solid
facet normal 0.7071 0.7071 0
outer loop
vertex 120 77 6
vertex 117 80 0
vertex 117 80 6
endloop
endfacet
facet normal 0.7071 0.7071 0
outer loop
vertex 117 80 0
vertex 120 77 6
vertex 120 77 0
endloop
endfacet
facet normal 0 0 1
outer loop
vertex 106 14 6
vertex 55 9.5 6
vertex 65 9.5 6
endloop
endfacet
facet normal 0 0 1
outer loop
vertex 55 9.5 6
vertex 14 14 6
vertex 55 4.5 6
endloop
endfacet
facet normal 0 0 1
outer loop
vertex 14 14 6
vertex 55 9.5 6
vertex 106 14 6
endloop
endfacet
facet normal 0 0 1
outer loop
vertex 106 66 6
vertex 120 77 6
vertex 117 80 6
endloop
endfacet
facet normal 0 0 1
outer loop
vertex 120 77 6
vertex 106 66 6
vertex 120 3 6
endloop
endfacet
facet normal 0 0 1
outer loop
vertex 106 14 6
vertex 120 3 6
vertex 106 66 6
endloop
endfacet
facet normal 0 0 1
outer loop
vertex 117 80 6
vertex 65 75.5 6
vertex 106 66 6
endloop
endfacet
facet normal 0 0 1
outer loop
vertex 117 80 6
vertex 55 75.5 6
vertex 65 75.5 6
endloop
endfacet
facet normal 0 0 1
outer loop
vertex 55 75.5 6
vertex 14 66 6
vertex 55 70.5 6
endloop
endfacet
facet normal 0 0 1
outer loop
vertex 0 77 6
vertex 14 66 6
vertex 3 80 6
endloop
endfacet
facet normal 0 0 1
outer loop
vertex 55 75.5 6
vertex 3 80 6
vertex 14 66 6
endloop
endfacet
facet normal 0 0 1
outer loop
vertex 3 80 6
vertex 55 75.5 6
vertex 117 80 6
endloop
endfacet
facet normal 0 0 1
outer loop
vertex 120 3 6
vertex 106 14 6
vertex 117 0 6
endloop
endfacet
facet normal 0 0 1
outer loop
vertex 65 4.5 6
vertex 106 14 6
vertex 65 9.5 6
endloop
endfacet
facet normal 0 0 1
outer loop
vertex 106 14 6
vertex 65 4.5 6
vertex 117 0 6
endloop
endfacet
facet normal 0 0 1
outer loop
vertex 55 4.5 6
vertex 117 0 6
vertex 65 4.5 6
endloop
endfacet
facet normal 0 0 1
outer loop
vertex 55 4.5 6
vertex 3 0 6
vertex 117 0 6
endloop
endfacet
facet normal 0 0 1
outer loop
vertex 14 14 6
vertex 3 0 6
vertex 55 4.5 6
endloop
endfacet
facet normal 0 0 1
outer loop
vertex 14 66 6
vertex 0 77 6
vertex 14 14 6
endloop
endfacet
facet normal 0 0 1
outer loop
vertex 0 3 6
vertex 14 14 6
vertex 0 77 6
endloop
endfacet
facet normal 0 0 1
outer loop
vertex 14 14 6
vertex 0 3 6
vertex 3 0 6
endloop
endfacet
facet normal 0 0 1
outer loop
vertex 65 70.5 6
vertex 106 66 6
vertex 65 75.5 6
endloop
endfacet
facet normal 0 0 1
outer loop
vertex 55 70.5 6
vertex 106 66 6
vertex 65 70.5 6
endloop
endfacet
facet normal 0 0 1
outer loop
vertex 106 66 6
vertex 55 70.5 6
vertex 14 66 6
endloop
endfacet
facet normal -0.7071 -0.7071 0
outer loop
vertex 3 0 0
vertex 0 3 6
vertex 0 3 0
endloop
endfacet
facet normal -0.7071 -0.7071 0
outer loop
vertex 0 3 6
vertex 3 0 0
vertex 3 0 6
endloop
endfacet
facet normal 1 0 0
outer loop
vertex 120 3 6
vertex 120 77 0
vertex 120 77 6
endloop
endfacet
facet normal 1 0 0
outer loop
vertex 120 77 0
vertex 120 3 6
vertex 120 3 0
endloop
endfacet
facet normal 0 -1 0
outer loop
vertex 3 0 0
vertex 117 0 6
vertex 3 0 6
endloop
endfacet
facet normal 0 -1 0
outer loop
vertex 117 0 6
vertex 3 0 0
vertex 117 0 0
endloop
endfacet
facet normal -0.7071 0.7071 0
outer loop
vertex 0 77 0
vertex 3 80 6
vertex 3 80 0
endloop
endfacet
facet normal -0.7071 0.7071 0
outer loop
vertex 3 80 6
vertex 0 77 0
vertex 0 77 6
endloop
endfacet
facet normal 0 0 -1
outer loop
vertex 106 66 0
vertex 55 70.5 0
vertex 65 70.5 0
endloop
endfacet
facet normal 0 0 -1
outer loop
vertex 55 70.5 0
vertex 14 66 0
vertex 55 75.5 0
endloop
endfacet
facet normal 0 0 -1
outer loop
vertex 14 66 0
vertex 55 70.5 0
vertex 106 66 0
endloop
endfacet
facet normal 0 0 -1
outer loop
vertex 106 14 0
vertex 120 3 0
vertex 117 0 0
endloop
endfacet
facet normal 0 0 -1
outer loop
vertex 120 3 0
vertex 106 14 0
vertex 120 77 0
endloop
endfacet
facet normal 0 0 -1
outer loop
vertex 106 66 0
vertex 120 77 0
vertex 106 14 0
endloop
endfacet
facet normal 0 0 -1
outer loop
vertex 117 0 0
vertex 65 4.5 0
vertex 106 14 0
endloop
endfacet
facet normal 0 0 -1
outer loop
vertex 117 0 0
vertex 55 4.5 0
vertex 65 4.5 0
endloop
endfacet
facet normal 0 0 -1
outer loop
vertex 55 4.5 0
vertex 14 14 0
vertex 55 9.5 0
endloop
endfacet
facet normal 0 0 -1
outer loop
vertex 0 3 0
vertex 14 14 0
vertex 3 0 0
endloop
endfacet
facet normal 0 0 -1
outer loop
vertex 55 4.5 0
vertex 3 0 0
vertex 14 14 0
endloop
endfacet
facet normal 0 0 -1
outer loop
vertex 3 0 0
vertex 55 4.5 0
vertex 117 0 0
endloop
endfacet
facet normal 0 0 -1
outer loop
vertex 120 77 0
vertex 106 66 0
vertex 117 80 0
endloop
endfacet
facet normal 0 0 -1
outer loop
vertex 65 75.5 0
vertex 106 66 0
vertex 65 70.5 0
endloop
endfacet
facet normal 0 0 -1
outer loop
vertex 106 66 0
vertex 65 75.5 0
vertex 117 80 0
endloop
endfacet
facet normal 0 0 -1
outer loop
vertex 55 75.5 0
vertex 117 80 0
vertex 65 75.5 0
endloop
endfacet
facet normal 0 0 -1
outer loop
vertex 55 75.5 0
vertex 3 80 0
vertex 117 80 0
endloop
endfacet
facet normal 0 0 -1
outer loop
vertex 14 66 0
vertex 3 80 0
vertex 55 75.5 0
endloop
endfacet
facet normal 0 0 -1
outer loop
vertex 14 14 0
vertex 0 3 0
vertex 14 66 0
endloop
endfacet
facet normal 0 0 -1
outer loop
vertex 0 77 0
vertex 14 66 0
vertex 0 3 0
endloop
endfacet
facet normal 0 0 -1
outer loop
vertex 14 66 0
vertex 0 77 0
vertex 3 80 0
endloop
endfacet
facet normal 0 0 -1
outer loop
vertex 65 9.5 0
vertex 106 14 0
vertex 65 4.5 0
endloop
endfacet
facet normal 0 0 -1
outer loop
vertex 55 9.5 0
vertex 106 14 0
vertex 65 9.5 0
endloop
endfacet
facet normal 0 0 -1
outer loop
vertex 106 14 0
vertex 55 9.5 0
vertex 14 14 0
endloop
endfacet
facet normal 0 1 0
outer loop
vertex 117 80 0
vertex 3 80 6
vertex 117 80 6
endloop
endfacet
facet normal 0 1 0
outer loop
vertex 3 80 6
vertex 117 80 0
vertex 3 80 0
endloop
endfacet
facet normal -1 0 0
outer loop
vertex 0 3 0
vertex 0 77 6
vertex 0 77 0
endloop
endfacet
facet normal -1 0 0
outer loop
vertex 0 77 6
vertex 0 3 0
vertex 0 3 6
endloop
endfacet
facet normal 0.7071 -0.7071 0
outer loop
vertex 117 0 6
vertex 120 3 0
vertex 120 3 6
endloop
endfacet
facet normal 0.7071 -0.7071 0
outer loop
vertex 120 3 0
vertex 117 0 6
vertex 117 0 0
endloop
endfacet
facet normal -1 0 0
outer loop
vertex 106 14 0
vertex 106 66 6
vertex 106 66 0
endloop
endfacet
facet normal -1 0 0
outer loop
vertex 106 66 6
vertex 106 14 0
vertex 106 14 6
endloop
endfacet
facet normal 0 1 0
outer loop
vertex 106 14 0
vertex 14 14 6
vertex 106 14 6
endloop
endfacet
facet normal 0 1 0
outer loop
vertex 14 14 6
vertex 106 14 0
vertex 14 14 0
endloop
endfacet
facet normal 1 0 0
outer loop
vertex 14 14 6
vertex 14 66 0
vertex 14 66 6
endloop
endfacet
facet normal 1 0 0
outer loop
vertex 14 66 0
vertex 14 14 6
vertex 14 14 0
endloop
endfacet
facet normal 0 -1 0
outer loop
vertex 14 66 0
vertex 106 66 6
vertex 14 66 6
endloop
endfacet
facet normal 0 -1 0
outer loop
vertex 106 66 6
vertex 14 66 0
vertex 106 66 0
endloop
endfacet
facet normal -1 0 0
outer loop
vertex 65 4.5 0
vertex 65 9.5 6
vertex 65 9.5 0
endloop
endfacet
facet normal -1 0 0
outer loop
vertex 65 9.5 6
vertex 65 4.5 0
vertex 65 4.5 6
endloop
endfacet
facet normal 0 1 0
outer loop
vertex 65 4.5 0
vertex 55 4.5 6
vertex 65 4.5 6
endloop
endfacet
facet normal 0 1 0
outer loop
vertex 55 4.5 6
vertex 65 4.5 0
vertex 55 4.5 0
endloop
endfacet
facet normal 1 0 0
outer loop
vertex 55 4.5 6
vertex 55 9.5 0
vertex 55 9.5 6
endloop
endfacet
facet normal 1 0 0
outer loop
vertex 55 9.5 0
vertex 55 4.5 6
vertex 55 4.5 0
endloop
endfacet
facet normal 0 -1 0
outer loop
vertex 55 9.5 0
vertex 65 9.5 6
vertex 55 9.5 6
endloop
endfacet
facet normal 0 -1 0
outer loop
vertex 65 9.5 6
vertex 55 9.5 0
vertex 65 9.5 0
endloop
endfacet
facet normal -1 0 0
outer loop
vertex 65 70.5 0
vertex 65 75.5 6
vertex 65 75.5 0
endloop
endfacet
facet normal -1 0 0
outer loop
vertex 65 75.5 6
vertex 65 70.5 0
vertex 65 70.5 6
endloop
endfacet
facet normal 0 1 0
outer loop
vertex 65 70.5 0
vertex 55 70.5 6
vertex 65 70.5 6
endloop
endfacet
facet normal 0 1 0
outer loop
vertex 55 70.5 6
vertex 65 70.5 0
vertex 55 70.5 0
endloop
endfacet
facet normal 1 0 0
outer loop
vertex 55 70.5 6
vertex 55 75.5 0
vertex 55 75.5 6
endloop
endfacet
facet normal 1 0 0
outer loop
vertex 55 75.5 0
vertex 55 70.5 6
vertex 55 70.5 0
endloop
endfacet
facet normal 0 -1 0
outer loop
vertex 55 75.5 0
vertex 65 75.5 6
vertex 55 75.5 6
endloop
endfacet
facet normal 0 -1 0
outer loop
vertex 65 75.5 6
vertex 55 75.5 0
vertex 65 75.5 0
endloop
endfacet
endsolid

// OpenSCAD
$fn = 32;

// ----------------------------------------------------------------------
// Frame plate: 120 x 80 frame, 14 mm rails
// ----------------------------------------------------------------------

// --- parameters (mm) ---
plate_l = 120;            // plate length, X
plate_w = 80;             // plate width, Y
plate_t = 6;              // plate thickness, Z (extrusion height)
corner_c = 3;             // corner chamfer
frame_bar = 14;           // frame rail width
slot_l = 10;              // adjustment slot length
slot_w = 5;               // adjustment slot width

win_l = plate_l - 2 * frame_bar;  // window length
win_w = plate_w - 2 * frame_bar;  // window width

profile = [[3, 0], [117, 0], [120, 3], [120, 77], [117, 80], [3, 80], [0, 77], [0, 3]];  // primary outline, 8 points, counter clockwise
void_1 = [[14, 14], [106, 14], [106, 66], [14, 66]];  // the window, 4 points
void_2 = [[55, 4.5], [65, 4.5], [65, 9.5], [55, 9.5]];  // adjustment slot, 4 points
void_3 = [[55, 70.5], [65, 70.5], [65, 75.5], [55, 75.5]];  // adjustment slot, 4 points

// --- the one profile operation ---
difference() {
  linear_extrude(height = plate_t) polygon(points = profile);
  translate([0, 0, -1])
    linear_extrude(height = plate_t + 2) polygon(points = void_1);
  translate([0, 0, -1])
    linear_extrude(height = plate_t + 2) polygon(points = void_2);
  translate([0, 0, -1])
    linear_extrude(height = plate_t + 2) polygon(points = void_3);
}
